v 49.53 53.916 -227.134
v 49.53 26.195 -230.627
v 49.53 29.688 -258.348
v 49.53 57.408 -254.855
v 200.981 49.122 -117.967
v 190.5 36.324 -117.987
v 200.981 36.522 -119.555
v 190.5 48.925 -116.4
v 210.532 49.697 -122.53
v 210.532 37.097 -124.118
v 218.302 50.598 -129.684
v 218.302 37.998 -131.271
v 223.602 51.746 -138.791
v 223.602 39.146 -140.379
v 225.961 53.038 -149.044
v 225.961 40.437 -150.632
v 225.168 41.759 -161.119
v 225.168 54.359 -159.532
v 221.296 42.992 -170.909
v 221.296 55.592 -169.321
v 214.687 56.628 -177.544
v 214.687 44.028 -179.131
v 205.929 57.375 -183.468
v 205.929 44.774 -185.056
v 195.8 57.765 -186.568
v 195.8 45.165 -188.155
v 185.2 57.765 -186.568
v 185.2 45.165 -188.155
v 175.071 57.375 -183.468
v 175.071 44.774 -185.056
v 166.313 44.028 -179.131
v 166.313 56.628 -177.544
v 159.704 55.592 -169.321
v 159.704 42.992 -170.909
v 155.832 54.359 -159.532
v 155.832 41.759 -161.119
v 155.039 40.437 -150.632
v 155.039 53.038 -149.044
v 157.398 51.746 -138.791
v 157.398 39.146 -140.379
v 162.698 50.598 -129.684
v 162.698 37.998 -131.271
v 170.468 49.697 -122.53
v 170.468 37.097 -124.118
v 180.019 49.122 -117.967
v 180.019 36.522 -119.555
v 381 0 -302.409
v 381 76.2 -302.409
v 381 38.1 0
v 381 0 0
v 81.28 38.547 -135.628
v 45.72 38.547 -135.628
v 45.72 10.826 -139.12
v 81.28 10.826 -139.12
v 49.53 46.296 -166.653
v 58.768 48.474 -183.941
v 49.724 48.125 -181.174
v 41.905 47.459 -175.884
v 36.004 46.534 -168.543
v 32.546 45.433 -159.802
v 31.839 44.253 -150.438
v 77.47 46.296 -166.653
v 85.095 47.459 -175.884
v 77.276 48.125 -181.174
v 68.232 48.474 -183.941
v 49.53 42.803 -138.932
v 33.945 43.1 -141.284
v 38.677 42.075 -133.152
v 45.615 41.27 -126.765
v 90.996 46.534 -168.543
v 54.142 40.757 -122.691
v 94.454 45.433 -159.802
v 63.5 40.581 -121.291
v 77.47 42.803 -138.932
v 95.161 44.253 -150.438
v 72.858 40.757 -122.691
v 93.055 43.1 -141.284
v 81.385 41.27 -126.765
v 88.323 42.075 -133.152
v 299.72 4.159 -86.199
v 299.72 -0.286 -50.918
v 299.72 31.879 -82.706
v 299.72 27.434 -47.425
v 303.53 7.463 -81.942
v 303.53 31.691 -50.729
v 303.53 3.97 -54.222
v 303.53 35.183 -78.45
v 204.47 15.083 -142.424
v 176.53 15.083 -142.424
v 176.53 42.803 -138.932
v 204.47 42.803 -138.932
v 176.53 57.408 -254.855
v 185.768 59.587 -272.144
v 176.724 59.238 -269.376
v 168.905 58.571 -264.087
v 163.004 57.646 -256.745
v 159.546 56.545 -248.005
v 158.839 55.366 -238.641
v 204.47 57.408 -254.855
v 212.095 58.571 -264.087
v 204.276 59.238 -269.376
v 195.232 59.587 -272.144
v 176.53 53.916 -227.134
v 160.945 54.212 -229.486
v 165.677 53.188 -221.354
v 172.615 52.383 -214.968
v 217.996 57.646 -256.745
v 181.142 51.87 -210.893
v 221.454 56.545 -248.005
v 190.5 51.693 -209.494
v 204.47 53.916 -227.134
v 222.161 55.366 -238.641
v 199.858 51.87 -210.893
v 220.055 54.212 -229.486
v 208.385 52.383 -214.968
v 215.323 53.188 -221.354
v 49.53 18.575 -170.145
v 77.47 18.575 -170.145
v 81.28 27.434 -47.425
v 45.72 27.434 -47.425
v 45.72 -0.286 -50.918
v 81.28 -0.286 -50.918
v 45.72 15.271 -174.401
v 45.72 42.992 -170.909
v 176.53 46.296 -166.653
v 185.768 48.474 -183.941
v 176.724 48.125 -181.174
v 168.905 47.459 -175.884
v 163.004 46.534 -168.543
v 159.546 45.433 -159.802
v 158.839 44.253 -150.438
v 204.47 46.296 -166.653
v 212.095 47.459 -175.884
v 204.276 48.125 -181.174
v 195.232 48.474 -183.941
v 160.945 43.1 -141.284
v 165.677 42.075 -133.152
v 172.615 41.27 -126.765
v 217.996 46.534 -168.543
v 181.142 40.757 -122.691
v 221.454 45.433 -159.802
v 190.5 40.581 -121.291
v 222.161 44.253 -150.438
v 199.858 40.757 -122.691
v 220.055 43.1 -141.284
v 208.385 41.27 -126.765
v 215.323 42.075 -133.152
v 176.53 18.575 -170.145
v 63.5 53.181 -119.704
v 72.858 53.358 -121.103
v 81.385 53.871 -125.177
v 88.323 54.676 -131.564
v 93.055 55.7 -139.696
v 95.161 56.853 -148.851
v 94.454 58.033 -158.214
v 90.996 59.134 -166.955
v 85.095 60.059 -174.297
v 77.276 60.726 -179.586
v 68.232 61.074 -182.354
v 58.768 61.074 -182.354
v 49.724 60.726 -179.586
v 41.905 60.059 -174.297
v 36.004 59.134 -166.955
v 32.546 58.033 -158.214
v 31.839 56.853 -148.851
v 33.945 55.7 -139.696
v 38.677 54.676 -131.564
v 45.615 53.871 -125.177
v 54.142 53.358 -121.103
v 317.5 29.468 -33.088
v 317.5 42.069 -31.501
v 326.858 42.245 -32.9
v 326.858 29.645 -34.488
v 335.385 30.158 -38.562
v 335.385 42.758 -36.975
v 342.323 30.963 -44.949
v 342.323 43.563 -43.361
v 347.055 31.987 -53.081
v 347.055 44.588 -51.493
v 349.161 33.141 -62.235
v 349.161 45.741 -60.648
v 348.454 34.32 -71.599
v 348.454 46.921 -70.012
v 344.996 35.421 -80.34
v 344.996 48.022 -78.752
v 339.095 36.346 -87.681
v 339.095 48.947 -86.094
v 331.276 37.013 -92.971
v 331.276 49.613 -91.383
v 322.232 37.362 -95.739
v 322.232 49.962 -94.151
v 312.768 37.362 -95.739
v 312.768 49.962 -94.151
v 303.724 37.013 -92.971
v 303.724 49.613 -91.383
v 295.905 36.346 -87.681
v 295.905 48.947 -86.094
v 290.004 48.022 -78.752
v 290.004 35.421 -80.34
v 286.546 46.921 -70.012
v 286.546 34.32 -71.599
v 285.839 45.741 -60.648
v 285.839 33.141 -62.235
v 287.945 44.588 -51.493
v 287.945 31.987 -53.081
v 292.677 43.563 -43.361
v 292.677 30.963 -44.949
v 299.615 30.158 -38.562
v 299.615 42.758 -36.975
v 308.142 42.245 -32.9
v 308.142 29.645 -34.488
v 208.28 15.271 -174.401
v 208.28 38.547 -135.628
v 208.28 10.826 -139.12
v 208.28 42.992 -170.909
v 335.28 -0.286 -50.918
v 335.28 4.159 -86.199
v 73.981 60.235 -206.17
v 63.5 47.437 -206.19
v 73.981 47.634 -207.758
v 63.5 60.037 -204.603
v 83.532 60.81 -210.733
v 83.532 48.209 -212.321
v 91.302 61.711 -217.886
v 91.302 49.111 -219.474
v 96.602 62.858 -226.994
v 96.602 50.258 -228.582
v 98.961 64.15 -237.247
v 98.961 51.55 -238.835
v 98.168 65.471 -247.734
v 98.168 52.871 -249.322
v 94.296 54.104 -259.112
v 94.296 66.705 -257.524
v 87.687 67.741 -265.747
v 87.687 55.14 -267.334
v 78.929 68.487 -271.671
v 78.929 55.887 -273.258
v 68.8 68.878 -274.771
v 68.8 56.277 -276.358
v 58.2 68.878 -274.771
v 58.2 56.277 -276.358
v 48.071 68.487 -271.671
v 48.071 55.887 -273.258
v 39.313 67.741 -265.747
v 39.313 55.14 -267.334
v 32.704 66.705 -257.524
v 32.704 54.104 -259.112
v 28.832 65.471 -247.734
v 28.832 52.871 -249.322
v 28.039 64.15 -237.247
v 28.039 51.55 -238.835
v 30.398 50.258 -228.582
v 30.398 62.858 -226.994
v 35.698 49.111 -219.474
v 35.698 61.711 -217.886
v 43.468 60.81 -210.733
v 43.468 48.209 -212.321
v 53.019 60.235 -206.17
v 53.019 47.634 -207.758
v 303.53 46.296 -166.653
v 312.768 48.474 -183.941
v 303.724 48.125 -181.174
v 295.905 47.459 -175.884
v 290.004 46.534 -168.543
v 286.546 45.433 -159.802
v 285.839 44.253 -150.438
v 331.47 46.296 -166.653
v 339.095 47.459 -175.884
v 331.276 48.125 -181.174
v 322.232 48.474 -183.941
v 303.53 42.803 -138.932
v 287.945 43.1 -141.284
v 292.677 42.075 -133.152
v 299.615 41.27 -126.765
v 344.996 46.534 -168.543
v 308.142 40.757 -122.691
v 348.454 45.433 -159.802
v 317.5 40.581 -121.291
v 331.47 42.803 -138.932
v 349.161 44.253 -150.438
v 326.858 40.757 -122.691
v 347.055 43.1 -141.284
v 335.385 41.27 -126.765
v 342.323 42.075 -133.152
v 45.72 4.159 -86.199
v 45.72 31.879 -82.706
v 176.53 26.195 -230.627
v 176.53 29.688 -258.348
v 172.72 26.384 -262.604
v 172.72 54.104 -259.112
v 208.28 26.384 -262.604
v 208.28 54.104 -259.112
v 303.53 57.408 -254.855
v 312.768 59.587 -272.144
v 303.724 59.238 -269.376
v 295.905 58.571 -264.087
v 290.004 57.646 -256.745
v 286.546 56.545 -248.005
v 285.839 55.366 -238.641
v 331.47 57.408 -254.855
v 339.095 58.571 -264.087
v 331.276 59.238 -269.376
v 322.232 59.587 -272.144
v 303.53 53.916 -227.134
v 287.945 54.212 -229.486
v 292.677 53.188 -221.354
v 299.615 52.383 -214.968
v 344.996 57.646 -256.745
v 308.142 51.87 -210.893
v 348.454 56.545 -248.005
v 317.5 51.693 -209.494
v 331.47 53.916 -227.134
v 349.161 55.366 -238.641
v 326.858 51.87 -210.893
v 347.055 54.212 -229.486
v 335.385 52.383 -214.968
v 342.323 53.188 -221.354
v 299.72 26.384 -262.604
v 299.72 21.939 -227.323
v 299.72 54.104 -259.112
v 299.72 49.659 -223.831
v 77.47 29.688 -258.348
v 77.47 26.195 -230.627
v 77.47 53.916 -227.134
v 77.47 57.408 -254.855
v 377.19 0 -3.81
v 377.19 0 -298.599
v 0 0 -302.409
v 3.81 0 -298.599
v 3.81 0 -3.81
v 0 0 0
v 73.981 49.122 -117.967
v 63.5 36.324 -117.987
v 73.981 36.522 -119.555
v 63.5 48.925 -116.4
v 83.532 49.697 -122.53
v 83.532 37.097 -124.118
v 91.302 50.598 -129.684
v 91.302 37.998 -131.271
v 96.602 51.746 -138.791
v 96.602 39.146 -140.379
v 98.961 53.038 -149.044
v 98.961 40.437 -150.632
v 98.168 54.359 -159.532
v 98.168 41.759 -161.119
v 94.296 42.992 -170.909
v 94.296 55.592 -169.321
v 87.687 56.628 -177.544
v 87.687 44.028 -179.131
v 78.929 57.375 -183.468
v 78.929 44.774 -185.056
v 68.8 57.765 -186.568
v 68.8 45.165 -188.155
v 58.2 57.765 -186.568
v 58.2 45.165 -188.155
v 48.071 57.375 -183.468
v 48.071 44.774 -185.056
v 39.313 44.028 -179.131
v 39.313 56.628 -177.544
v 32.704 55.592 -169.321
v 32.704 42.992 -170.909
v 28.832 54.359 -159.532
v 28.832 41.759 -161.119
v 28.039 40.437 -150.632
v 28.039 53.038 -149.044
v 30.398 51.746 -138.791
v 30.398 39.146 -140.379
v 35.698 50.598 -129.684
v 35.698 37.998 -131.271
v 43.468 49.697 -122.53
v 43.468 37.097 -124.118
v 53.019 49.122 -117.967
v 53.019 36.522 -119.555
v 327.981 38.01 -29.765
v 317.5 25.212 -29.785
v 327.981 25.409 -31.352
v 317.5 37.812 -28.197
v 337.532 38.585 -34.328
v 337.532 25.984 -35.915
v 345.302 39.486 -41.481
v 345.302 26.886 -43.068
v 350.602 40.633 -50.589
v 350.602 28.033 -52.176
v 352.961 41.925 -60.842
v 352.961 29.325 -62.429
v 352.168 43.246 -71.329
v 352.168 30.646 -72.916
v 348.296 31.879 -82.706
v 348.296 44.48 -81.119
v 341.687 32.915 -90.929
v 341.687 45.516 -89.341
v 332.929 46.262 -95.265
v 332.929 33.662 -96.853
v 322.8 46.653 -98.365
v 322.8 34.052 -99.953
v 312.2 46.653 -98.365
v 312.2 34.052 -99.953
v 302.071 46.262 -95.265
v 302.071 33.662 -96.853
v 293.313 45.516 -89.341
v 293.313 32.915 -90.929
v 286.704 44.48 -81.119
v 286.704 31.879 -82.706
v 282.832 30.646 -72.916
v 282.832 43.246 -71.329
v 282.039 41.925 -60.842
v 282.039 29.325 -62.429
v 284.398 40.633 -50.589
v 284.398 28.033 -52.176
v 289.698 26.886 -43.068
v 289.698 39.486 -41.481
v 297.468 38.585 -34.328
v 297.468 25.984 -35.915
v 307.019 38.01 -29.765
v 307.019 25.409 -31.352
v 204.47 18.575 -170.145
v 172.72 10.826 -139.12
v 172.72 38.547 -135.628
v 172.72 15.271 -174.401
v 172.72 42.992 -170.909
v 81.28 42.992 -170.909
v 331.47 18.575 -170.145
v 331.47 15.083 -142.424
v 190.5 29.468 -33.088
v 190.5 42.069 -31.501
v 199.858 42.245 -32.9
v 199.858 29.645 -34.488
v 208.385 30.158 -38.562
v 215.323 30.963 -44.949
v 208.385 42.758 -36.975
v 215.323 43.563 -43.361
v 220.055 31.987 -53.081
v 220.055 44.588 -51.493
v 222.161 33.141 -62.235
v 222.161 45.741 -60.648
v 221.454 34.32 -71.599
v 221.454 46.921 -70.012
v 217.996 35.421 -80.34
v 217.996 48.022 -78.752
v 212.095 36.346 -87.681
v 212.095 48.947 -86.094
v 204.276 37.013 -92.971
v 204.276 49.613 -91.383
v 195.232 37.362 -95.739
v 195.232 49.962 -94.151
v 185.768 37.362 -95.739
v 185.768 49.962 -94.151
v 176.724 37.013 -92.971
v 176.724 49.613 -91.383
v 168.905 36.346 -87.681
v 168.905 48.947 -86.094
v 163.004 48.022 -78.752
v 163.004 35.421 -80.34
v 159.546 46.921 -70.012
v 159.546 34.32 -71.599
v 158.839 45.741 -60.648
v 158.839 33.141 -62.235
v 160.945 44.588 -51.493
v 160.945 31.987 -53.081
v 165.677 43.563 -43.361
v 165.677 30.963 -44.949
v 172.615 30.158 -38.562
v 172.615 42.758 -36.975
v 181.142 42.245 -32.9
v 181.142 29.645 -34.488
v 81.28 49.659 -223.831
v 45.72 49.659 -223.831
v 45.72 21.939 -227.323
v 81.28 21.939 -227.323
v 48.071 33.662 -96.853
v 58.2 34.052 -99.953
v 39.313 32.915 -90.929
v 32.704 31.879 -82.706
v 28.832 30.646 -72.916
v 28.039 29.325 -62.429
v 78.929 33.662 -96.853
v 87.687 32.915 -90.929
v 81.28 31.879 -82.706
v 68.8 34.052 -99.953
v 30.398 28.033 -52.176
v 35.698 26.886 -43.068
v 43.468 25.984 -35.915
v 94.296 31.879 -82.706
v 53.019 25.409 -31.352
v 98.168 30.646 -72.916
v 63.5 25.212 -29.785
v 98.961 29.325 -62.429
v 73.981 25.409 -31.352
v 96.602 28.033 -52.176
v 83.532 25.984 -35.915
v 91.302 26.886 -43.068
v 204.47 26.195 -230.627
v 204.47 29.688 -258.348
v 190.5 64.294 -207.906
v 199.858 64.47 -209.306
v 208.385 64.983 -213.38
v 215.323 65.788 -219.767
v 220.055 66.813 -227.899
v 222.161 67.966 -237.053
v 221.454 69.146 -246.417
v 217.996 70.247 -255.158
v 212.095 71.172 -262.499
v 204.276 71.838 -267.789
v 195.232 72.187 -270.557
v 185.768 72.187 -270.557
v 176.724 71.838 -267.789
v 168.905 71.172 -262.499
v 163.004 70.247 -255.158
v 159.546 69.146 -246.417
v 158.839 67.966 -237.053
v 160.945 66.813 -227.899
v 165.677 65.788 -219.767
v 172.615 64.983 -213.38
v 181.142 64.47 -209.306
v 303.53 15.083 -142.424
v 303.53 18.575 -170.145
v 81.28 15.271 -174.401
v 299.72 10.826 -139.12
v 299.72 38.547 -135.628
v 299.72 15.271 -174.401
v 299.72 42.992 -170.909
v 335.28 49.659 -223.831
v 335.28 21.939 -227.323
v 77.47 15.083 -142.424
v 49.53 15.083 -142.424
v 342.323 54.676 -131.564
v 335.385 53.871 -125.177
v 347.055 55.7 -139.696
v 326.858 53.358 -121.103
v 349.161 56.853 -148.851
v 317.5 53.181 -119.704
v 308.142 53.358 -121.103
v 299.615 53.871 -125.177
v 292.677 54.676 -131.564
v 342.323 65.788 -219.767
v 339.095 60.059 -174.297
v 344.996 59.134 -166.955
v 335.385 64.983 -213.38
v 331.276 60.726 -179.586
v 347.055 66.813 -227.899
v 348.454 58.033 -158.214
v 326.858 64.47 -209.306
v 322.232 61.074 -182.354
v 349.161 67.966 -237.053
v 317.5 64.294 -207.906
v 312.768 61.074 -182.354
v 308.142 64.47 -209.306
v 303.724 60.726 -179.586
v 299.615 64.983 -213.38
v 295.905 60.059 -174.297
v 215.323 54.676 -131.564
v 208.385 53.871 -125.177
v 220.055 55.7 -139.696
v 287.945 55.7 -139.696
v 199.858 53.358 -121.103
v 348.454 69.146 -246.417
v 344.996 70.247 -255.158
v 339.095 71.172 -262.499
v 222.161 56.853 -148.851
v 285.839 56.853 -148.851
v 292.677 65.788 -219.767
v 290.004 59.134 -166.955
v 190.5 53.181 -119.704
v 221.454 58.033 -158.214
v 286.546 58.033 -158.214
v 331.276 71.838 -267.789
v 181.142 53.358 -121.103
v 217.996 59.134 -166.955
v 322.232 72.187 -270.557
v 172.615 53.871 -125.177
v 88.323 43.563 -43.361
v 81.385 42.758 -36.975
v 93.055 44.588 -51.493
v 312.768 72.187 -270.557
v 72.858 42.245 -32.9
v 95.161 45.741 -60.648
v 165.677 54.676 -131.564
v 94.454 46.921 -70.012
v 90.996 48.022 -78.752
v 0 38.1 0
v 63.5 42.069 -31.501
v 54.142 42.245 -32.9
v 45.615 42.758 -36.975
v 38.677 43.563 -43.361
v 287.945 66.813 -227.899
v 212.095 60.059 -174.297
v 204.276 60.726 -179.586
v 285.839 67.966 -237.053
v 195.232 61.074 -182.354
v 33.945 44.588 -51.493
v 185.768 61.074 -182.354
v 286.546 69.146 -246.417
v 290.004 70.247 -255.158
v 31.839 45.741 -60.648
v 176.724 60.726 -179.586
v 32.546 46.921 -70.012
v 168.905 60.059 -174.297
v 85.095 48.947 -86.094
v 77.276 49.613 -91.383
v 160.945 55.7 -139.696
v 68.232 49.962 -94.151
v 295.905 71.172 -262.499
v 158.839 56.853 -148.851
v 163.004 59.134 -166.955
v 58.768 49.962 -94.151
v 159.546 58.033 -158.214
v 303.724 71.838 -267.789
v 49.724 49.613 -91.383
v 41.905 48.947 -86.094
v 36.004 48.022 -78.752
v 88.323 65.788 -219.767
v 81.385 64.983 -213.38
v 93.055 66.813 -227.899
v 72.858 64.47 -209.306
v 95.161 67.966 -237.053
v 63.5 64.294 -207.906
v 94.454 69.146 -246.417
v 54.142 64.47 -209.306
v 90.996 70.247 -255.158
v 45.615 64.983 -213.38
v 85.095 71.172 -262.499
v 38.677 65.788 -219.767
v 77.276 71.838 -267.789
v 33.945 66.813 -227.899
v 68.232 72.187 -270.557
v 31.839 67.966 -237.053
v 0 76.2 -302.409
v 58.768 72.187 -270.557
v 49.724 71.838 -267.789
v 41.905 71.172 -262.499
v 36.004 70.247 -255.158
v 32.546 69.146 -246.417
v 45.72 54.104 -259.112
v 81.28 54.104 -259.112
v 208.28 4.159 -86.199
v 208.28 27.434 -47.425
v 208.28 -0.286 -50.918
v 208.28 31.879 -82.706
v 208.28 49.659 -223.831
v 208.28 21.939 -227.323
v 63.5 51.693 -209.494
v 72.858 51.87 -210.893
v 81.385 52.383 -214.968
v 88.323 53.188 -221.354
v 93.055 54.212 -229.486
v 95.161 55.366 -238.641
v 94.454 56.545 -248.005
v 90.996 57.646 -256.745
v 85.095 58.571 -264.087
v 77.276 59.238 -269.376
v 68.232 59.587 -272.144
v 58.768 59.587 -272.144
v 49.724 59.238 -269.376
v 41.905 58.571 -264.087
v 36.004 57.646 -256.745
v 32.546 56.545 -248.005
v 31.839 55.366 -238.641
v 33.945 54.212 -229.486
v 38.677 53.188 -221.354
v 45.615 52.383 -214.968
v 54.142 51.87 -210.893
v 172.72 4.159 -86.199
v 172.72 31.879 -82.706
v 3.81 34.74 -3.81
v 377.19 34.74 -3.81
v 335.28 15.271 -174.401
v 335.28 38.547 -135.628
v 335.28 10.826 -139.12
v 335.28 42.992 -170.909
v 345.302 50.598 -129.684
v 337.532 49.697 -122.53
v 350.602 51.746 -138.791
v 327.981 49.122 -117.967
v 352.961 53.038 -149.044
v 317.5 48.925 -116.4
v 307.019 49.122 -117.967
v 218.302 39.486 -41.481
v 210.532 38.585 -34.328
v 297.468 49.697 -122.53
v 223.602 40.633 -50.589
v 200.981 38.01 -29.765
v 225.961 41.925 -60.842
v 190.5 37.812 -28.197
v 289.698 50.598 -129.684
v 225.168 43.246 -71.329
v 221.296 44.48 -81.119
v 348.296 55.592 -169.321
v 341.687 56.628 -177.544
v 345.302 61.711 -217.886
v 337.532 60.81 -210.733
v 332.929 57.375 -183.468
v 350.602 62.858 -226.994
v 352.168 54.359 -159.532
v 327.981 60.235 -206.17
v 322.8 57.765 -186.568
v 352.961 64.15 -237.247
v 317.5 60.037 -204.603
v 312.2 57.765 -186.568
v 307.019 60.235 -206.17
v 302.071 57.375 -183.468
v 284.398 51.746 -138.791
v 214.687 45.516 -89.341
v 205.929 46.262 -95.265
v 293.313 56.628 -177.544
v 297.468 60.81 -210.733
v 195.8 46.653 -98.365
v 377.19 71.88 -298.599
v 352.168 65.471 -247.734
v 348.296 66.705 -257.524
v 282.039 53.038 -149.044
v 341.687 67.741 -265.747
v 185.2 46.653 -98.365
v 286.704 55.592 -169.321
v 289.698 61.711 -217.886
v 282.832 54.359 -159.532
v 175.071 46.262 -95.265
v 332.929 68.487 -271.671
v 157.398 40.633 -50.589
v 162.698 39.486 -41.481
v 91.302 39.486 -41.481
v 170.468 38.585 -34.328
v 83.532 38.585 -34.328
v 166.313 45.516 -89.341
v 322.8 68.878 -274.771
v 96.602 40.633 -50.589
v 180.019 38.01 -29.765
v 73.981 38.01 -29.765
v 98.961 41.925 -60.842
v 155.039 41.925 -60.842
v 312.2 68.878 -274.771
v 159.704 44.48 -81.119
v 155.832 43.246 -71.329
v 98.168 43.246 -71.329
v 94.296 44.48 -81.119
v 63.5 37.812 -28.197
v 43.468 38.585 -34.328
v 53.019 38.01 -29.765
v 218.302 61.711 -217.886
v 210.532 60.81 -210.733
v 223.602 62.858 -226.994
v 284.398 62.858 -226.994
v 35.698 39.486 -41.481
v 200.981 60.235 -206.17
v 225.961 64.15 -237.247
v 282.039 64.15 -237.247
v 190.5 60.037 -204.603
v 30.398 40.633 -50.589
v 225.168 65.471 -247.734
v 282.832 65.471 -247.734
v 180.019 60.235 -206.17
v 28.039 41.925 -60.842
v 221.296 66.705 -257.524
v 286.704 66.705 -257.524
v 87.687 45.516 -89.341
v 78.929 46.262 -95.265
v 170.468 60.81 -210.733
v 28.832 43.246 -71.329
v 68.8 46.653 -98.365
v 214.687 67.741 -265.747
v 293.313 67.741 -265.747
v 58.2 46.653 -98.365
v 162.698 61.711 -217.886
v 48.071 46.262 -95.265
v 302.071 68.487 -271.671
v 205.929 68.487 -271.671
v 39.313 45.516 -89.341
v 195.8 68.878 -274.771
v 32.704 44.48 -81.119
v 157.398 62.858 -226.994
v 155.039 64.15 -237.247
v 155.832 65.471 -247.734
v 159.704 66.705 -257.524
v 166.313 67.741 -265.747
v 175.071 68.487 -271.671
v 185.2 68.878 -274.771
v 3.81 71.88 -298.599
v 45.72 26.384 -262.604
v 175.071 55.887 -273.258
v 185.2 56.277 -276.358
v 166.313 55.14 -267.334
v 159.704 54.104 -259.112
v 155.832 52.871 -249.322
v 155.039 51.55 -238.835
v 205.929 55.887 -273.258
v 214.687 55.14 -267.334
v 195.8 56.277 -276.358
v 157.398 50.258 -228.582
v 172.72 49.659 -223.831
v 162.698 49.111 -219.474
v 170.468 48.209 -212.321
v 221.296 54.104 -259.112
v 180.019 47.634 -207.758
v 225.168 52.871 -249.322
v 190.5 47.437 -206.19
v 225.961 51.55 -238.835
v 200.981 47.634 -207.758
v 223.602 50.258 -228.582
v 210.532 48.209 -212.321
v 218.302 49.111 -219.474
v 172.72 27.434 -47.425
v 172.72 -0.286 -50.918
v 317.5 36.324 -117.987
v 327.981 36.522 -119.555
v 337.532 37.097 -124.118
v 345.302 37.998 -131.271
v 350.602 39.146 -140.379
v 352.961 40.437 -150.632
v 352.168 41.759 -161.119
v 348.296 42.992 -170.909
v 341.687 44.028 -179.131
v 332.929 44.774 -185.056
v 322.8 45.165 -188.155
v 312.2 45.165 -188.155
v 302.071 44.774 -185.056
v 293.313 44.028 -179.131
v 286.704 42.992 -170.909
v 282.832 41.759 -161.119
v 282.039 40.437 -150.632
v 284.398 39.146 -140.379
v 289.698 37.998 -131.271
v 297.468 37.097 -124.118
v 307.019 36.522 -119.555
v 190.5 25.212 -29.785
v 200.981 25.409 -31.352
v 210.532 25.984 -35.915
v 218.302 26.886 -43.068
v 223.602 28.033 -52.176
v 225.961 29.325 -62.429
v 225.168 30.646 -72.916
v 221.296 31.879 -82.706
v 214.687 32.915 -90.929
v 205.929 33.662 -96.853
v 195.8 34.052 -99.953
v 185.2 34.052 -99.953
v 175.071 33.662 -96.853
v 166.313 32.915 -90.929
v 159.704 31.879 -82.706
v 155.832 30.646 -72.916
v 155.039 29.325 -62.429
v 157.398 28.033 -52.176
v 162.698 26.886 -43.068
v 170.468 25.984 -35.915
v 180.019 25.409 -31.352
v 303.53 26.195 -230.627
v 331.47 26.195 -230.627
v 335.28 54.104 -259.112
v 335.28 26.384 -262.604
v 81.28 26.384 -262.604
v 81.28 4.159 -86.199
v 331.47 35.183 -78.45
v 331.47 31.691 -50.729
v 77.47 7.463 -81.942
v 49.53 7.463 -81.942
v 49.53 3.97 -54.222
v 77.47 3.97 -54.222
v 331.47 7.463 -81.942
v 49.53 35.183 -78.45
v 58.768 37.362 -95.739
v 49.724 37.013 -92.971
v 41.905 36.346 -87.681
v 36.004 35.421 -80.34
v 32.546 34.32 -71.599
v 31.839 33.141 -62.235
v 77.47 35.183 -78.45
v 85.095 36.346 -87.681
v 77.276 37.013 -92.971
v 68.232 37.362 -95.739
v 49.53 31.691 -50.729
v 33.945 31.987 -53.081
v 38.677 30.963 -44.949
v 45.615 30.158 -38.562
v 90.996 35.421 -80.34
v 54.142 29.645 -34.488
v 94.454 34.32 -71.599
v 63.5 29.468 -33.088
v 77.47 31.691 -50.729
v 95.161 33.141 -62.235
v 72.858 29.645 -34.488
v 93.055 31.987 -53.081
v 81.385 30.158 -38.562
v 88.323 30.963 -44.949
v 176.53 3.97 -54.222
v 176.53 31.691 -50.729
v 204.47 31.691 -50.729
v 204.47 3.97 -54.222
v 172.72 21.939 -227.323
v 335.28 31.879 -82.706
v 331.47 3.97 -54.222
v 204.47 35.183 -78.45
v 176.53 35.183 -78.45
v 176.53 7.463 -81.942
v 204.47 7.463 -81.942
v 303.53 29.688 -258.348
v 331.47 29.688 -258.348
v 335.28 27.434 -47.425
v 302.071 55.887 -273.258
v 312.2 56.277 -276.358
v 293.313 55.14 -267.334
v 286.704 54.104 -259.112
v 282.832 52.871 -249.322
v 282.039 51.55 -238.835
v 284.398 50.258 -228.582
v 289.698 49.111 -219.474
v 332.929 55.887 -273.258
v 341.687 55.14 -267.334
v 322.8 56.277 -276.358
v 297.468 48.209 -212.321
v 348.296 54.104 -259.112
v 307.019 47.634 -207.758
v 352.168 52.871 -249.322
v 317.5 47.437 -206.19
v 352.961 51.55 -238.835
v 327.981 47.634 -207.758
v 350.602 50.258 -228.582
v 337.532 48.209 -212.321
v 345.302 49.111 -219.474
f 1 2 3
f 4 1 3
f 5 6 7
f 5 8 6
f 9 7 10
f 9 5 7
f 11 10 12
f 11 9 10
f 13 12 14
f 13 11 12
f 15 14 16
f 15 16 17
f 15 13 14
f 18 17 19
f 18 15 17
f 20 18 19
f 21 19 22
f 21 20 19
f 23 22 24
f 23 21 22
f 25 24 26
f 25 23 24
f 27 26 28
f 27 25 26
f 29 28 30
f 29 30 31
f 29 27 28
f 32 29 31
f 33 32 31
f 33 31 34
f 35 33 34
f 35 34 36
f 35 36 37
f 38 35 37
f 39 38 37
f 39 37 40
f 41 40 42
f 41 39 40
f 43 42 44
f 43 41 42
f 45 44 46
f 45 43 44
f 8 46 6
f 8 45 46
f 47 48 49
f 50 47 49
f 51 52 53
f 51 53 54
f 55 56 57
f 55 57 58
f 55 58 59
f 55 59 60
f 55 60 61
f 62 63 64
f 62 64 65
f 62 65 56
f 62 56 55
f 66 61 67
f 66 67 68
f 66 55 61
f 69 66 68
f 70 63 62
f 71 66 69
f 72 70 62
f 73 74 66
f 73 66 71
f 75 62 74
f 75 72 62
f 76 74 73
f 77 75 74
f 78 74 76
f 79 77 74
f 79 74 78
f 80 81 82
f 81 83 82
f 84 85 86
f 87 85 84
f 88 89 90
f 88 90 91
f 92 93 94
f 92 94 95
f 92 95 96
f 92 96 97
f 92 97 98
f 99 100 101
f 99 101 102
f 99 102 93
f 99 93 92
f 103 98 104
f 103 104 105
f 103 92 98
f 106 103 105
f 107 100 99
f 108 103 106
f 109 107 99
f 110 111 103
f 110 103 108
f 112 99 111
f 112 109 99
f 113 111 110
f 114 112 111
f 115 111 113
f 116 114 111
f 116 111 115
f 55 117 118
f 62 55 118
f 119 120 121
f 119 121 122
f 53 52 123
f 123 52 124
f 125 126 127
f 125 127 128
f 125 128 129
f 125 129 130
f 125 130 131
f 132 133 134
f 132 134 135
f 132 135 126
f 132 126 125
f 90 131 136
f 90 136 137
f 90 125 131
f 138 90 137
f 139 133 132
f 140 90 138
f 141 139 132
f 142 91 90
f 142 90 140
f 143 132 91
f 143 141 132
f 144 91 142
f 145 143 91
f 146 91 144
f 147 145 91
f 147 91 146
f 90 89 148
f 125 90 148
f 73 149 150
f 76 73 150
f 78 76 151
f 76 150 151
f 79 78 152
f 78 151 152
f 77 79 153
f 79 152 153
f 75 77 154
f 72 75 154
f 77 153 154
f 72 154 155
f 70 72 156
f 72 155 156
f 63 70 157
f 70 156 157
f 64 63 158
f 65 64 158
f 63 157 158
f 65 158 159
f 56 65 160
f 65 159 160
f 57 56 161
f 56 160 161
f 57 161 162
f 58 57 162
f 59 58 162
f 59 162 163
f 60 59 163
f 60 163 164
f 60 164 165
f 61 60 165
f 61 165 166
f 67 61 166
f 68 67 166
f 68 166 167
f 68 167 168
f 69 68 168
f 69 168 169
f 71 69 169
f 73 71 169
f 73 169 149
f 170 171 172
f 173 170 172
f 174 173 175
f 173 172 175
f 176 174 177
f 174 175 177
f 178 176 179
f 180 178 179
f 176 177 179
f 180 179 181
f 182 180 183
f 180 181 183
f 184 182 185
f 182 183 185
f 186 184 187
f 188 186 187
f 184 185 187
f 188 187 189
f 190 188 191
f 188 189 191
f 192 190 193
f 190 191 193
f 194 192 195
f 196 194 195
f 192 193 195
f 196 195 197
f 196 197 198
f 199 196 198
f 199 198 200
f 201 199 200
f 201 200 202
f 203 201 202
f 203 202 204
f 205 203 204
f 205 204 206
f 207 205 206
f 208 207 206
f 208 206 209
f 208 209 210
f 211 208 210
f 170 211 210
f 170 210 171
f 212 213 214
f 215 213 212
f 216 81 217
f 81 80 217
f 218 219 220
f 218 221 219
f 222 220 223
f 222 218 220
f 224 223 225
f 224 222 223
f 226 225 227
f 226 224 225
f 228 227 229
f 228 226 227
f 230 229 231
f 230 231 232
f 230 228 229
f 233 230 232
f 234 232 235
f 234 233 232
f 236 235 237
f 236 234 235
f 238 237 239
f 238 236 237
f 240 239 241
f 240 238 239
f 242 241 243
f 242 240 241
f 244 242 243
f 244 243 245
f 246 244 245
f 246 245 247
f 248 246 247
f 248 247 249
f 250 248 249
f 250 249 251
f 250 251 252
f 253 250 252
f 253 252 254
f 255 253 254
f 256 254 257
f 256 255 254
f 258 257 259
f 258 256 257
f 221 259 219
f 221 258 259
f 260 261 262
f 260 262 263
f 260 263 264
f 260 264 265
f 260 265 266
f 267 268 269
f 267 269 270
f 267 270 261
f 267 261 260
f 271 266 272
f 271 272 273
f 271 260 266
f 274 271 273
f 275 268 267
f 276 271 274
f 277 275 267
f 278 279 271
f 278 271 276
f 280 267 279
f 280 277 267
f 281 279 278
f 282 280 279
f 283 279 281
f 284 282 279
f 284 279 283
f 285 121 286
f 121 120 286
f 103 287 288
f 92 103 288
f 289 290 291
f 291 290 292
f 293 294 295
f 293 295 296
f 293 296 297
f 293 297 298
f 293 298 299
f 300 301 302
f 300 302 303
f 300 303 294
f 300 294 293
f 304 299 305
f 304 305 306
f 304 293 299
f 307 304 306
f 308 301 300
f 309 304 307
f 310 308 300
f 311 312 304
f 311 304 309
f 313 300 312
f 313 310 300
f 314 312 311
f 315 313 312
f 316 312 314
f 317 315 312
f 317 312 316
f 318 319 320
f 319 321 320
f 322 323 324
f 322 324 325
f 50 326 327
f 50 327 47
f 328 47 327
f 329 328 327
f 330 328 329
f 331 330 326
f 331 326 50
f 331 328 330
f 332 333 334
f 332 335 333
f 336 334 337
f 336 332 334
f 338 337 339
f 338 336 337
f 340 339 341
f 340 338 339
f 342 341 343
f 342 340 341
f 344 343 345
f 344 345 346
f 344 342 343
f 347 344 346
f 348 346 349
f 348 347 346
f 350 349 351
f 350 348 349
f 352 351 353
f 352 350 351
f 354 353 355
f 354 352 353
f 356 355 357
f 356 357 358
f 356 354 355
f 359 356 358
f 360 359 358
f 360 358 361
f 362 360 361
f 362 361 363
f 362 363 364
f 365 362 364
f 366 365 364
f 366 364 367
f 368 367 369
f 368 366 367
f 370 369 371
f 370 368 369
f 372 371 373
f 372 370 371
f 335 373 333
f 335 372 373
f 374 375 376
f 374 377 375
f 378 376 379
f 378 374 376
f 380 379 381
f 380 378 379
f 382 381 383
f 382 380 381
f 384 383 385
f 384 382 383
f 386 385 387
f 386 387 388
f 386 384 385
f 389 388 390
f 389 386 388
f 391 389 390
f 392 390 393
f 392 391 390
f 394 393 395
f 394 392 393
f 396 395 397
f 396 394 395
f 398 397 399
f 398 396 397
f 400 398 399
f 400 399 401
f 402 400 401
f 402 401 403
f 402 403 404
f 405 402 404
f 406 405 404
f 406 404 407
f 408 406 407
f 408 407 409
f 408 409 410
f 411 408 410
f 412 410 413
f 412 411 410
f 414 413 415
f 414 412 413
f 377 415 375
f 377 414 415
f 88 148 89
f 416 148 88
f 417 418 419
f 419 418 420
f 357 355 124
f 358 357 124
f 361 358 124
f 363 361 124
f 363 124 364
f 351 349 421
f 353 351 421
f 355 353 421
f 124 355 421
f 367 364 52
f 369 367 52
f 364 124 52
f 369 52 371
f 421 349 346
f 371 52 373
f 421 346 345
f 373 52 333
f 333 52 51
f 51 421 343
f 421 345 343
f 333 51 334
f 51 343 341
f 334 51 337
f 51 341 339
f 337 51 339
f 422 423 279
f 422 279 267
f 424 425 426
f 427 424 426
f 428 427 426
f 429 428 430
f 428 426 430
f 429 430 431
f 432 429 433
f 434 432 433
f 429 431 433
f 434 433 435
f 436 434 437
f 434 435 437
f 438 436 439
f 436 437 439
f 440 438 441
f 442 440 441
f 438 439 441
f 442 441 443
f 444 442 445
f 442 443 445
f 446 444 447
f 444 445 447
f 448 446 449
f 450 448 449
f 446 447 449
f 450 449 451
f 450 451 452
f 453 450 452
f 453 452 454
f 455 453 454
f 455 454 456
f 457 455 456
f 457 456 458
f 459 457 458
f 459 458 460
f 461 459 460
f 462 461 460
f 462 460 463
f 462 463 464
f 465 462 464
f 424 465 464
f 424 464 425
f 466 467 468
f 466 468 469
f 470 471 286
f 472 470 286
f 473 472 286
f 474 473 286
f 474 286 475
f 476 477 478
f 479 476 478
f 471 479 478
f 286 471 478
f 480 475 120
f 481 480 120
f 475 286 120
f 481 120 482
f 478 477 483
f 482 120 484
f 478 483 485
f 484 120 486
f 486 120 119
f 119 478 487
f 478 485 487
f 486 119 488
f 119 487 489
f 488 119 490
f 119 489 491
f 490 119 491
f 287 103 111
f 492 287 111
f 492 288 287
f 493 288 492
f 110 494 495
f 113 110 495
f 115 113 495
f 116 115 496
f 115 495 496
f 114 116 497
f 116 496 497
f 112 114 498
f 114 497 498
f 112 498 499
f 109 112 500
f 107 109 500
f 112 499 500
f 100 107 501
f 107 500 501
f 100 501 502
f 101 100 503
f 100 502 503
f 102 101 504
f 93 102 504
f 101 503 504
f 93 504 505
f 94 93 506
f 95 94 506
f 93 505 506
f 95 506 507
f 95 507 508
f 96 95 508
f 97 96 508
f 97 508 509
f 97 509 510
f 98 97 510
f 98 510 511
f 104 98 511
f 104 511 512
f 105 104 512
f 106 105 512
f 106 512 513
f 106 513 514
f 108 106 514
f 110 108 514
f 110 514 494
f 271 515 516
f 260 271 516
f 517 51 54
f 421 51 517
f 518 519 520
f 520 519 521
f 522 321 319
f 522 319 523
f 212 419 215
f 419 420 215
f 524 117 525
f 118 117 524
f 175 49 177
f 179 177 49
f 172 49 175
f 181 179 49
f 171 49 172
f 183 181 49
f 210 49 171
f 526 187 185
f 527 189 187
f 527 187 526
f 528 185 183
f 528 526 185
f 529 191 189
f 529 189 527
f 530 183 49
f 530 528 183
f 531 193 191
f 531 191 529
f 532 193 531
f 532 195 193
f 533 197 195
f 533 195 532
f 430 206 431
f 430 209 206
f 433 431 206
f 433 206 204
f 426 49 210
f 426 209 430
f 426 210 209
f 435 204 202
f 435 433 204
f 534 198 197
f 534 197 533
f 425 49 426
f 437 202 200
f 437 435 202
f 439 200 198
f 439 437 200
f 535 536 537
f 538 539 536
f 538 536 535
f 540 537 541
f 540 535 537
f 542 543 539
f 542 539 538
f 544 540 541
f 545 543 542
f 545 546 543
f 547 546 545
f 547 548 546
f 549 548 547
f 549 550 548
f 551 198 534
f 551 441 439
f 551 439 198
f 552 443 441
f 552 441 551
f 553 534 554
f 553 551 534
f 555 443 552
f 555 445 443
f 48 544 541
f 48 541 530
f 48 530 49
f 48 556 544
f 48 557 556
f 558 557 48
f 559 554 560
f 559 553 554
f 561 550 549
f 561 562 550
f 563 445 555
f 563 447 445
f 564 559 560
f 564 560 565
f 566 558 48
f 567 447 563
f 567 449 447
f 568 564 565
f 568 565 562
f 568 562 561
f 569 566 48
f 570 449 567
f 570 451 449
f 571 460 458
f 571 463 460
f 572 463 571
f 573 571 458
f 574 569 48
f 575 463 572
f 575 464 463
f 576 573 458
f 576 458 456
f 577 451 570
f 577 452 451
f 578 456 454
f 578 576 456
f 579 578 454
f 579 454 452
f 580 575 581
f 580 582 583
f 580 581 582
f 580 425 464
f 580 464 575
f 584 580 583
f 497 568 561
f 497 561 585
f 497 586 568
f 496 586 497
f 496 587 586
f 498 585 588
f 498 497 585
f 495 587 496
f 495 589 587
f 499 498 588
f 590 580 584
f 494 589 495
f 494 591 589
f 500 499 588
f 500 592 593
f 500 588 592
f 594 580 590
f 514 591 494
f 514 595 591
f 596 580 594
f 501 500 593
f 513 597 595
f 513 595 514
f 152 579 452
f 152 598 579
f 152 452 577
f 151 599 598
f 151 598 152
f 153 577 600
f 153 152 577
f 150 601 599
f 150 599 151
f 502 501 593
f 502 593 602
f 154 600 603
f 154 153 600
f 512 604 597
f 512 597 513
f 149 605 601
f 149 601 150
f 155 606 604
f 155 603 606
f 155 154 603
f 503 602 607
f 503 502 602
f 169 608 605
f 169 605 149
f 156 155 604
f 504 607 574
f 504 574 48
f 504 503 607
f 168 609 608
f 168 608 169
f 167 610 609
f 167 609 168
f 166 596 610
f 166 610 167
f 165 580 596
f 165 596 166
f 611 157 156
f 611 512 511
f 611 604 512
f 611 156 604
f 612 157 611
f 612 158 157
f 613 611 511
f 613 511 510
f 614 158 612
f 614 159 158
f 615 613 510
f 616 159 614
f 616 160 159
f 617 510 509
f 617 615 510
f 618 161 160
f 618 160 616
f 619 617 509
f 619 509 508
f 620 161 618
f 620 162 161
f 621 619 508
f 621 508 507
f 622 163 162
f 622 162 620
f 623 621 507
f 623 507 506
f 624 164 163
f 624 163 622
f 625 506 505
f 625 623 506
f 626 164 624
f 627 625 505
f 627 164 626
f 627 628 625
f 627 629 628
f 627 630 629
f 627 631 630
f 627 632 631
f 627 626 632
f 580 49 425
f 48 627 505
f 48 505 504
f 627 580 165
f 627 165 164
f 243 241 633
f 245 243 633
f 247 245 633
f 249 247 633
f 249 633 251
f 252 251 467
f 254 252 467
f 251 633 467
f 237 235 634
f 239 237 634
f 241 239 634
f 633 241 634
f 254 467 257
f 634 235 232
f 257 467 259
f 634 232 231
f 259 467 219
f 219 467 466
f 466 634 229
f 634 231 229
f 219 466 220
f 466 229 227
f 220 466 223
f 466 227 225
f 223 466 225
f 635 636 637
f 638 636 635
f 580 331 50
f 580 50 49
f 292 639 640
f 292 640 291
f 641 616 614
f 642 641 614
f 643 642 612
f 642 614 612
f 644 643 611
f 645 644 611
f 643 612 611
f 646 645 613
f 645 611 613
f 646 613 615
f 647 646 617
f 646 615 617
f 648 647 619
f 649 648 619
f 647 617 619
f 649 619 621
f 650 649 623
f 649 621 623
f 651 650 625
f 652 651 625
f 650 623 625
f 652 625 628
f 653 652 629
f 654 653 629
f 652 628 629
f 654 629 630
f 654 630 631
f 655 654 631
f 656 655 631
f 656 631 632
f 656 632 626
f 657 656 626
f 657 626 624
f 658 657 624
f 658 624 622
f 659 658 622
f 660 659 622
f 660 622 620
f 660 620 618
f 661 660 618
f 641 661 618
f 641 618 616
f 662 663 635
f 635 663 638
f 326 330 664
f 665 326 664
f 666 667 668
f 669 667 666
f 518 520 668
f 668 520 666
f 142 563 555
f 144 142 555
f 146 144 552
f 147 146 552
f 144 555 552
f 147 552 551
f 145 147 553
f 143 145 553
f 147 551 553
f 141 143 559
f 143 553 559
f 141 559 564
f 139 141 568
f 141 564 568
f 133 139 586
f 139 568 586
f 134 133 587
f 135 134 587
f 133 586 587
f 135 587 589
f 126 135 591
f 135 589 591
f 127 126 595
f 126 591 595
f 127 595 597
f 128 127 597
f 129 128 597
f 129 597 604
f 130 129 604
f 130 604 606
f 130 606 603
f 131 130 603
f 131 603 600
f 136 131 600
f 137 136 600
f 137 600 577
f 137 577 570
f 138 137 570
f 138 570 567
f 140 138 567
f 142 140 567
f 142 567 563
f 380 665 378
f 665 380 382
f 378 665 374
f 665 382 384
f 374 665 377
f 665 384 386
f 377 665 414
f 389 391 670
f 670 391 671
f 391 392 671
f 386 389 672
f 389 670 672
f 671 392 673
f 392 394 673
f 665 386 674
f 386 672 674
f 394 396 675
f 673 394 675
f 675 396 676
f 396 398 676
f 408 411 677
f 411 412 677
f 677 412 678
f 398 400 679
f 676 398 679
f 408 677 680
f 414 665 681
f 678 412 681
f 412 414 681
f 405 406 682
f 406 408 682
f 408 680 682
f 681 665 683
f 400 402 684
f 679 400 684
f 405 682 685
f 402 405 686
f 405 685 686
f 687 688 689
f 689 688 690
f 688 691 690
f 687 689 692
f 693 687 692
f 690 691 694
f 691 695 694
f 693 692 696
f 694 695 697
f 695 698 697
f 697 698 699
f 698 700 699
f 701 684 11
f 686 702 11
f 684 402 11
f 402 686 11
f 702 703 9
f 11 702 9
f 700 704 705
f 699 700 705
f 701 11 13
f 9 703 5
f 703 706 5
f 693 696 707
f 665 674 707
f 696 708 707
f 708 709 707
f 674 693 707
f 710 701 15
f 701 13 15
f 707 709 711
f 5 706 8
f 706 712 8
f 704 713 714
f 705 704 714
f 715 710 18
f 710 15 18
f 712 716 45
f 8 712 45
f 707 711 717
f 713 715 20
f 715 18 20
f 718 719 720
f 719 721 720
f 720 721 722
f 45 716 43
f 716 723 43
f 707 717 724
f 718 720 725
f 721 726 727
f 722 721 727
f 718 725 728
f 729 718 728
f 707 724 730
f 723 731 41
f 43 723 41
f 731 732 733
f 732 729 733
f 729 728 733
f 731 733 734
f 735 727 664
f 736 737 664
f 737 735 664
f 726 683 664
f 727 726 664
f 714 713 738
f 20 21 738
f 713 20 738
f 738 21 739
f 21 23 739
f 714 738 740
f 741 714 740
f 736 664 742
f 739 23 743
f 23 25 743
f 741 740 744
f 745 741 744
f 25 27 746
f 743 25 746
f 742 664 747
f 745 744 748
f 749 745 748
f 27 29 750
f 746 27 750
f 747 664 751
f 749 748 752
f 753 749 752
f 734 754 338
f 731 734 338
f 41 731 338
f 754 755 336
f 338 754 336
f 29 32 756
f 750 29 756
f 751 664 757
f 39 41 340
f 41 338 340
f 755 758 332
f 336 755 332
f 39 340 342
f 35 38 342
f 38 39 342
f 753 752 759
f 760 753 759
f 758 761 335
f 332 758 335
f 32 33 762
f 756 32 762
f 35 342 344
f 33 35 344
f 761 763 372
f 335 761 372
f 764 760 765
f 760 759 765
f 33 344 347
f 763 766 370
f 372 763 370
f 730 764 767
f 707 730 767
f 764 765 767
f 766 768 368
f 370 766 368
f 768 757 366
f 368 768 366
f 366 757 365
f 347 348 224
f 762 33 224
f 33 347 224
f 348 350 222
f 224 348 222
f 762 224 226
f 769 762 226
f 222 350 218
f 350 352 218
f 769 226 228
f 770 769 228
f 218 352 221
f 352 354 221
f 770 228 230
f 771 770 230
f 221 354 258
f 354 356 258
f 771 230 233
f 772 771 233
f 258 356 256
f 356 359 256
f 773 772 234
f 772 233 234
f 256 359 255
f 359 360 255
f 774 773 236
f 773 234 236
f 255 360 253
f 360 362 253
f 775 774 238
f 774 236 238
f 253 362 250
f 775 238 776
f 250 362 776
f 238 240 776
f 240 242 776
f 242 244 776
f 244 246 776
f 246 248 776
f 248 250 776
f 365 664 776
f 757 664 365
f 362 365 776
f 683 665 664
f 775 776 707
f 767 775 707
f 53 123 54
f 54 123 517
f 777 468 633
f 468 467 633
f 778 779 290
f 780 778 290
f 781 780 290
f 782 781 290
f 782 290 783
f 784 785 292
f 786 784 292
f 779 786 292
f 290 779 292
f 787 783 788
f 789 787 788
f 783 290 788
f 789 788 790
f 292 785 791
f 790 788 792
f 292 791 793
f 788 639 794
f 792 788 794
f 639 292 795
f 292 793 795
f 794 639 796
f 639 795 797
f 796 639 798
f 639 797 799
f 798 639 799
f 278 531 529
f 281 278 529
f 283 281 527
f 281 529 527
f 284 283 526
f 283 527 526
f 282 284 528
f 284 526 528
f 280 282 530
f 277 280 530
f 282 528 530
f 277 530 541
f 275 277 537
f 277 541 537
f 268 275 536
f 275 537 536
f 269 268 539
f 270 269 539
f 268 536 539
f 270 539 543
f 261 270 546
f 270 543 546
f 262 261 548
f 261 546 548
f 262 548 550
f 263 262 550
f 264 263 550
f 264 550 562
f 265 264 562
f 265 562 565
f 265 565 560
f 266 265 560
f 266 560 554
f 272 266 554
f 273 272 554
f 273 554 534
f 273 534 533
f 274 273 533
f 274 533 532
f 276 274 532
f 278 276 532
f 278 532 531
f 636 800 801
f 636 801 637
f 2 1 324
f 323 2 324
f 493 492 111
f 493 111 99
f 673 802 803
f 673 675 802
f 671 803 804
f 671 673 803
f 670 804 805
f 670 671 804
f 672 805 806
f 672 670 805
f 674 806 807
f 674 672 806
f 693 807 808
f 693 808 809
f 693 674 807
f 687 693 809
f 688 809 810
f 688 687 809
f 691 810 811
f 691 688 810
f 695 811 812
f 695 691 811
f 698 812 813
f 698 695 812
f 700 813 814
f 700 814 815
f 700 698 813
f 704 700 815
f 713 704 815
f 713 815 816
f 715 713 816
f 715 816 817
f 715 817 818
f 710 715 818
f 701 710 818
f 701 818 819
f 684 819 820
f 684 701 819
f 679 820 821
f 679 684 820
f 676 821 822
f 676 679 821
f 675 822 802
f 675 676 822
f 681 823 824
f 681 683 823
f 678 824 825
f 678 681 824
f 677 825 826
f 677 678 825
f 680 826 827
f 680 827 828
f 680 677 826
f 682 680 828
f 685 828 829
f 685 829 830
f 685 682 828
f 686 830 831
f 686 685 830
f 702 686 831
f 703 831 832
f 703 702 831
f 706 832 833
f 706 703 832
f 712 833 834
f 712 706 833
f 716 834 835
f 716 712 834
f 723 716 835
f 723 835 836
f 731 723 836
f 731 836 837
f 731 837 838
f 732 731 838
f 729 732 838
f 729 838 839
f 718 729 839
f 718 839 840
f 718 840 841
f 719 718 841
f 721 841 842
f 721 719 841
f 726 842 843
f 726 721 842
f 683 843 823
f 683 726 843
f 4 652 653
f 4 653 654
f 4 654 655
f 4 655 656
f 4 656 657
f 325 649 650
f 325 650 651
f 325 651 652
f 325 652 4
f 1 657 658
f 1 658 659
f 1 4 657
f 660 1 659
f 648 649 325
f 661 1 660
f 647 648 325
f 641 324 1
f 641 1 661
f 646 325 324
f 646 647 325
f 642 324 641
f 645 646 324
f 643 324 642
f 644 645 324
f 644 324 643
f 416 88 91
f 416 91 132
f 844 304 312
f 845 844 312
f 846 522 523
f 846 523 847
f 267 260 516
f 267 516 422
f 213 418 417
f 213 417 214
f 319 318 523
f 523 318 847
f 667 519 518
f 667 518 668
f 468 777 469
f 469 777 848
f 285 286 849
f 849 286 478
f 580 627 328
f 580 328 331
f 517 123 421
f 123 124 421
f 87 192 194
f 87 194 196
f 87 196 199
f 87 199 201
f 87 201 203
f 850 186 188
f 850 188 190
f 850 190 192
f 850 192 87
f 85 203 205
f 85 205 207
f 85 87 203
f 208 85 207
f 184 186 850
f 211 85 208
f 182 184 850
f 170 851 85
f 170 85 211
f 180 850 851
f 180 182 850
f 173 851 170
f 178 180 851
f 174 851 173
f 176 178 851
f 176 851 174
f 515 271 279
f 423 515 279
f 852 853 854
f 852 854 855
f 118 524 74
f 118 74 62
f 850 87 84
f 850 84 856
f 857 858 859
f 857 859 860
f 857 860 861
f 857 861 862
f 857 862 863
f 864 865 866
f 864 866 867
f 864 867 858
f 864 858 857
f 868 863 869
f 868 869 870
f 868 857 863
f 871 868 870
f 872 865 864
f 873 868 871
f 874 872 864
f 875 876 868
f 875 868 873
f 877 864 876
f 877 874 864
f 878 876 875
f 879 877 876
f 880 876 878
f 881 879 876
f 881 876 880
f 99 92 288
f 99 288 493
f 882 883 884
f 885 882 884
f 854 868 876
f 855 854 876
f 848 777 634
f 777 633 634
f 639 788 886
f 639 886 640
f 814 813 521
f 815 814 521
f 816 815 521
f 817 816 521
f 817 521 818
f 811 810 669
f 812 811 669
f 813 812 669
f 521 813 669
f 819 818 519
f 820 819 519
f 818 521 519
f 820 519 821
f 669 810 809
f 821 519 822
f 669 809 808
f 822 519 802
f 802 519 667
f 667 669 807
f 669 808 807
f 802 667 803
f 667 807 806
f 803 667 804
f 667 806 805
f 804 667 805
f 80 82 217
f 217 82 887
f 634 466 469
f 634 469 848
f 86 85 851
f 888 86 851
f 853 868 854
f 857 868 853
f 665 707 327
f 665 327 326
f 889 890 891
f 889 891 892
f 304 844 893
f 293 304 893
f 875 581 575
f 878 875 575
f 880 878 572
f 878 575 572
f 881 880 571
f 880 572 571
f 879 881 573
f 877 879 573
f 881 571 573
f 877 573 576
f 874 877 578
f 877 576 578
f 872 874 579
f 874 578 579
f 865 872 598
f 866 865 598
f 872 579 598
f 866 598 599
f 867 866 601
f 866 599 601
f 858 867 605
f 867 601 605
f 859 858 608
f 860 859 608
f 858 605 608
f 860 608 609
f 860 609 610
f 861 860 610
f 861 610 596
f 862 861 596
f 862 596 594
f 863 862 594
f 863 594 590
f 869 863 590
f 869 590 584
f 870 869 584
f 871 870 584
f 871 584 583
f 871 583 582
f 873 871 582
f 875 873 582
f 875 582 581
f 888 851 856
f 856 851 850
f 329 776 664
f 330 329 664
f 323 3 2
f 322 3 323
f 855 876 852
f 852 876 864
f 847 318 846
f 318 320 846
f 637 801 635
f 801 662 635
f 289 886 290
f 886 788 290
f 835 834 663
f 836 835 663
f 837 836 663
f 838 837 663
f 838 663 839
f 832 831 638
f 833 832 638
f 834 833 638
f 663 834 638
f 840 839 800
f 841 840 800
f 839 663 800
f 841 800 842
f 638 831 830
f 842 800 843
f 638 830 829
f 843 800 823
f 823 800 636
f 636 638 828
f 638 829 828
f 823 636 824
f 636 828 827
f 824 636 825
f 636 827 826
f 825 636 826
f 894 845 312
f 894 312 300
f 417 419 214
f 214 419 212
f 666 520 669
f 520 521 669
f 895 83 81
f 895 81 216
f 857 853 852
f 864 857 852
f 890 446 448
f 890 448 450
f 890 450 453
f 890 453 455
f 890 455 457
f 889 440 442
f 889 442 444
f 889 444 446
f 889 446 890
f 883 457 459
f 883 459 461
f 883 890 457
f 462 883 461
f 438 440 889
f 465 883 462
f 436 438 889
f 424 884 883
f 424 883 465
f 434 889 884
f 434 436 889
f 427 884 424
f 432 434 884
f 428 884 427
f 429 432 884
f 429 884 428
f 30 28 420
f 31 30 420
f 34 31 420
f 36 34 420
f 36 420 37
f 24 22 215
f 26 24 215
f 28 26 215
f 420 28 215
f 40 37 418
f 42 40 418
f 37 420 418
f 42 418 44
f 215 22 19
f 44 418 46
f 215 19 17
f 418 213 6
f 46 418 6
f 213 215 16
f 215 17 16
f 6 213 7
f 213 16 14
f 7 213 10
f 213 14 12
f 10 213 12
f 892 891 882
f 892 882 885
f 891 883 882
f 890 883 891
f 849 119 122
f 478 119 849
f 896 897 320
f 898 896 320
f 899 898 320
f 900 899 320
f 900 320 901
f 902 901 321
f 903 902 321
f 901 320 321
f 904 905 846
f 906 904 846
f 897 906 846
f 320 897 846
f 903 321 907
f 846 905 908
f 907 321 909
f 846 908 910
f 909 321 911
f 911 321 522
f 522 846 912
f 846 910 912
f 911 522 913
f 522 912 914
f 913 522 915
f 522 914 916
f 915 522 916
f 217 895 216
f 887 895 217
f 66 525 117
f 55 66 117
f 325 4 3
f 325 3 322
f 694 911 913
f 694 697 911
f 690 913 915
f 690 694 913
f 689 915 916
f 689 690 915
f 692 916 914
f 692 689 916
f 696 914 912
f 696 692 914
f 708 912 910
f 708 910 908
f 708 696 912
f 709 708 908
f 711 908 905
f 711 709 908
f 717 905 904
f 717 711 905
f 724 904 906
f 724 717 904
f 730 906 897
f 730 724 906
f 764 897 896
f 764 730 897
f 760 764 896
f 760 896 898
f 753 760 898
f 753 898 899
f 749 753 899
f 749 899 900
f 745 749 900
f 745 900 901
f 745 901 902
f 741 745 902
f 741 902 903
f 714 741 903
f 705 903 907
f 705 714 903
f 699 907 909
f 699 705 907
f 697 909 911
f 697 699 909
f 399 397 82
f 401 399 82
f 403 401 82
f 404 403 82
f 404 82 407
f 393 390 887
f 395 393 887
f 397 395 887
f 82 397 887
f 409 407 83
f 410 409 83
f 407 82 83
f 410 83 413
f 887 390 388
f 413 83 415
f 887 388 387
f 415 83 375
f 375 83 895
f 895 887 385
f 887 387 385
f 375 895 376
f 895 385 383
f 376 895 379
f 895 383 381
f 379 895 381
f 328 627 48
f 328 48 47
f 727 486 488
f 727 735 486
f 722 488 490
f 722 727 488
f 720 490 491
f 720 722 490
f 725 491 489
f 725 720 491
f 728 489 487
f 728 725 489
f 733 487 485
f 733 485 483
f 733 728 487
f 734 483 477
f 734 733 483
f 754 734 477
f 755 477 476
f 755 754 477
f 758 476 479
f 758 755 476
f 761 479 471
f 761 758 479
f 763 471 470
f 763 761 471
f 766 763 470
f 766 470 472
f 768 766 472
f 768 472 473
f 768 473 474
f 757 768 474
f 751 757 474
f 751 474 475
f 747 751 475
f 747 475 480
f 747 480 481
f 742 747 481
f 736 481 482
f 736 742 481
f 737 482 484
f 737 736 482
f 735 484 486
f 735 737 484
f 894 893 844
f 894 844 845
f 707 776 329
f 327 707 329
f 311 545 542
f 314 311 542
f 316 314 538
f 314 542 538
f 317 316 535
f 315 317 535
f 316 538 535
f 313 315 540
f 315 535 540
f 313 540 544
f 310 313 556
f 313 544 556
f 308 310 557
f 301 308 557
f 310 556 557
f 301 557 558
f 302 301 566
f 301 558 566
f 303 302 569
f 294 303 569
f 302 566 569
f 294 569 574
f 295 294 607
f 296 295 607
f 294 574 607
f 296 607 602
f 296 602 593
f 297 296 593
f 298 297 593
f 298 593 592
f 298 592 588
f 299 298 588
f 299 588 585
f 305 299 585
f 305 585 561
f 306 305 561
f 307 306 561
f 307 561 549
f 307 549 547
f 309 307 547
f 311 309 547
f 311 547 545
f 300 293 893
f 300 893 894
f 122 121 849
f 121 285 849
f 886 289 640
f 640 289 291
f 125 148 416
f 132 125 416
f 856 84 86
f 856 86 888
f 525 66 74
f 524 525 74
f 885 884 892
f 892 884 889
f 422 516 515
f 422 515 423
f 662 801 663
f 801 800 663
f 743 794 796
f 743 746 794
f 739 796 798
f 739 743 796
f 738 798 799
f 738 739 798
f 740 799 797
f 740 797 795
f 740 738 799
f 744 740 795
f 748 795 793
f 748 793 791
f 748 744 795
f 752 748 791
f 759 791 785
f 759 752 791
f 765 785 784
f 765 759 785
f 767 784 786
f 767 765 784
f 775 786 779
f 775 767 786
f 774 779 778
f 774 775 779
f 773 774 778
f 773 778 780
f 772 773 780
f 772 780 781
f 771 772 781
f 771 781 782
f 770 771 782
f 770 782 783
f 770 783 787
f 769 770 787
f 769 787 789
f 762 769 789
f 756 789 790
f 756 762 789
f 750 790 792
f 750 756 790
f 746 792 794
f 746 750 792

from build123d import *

# Parameters (mm, degrees)
BOSS_EXTRUDE1_DEPTH = 381
SKETCH2_R           = 31.75
SKETCH2_W           = 27.94
SKETCH2_H           = 27.94
CUT_EXTRUDE2_DEPTH  = 15.24
SKETCH2_3_W         = 27.94
SKETCH2_3_H         = 27.94
CUT_EXTRUDE3_DEPTH  = 43.18
SHELL1_T            = -3.81


with BuildPart() as part:
    # Sketch1 → Boss-Extrude1 (new body)
    with BuildSketch(Plane(origin=(0, 0, 0), x_dir=(0, 0, -1), z_dir=(1, 0, 0))):
        Polygon((0, 0), (0, 38.1), (302.409374855, 76.2), (302.409374855, 0), align=None)
    extrude(amount=BOSS_EXTRUDE1_DEPTH)

    # Sketch2 → Cut-Extrude2 (cut)
    # profile 1 of 9: a face of its own
    with BuildSketch(Plane(origin=(0, 40.024765624, 5.042646482), x_dir=(1, 0, 0), z_dir=(0, 0.9921567416492215, 0.12500000000000003))):
        with Locations((63.5, 246.0625)):
            Circle(SKETCH2_R)
        with Locations((63.5, 246.0625)):
            Rectangle(SKETCH2_W, SKETCH2_H, mode=Mode.SUBTRACT)
    # profile 2 of 9: a face of its own
    with BuildSketch(Plane(origin=(0, 40.024765624, 5.042646482), x_dir=(1, 0, 0), z_dir=(0, 0.9921567416492215, 0.12500000000000003))):
        with Locations((190.5, 246.0625)):
            Circle(SKETCH2_R)
        with Locations((190.5, 246.0625)):
            Rectangle(SKETCH2_W, SKETCH2_H, mode=Mode.SUBTRACT)
    # profile 3 of 9: a face of its own
    with BuildSketch(Plane(origin=(0, 40.024765624, 5.042646482), x_dir=(1, 0, 0), z_dir=(0, 0.9921567416492215, 0.12500000000000003))):
        with Locations((317.5, 246.0625)):
            Circle(SKETCH2_R)
        with Locations((317.5, 246.0625)):
            Rectangle(SKETCH2_W, SKETCH2_H, mode=Mode.SUBTRACT)
    # profile 4 of 9: a face of its own
    with BuildSketch(Plane(origin=(0, 40.024765624, 5.042646482), x_dir=(1, 0, 0), z_dir=(0, 0.9921567416492215, 0.12500000000000003))):
        with Locations((63.5, 157.1625)):
            Circle(SKETCH2_R)
        with Locations((63.5, 157.1625)):
            Rectangle(SKETCH2_W, SKETCH2_H, mode=Mode.SUBTRACT)
    # profile 5 of 9: a face of its own
    with BuildSketch(Plane(origin=(0, 40.024765624, 5.042646482), x_dir=(1, 0, 0), z_dir=(0, 0.9921567416492215, 0.12500000000000003))):
        with Locations((63.5, 68.2625)):
            Circle(SKETCH2_R)
        with Locations((63.5, 68.2625)):
            Rectangle(SKETCH2_W, SKETCH2_H, mode=Mode.SUBTRACT)
    # profile 6 of 9: a face of its own
    with BuildSketch(Plane(origin=(0, 40.024765624, 5.042646482), x_dir=(1, 0, 0), z_dir=(0, 0.9921567416492215, 0.12500000000000003))):
        with Locations((190.5, 157.1625)):
            Circle(SKETCH2_R)
        with Locations((190.5, 157.1625)):
            Rectangle(SKETCH2_W, SKETCH2_H, mode=Mode.SUBTRACT)
    # profile 7 of 9: a face of its own
    with BuildSketch(Plane(origin=(0, 40.024765624, 5.042646482), x_dir=(1, 0, 0), z_dir=(0, 0.9921567416492215, 0.12500000000000003))):
        with Locations((190.5, 68.2625)):
            Circle(SKETCH2_R)
        with Locations((190.5, 68.2625)):
            Rectangle(SKETCH2_W, SKETCH2_H, mode=Mode.SUBTRACT)
    # profile 8 of 9: a face of its own
    with BuildSketch(Plane(origin=(0, 40.024765624, 5.042646482), x_dir=(1, 0, 0), z_dir=(0, 0.9921567416492215, 0.12500000000000003))):
        with Locations((317.5, 68.2625)):
            Circle(SKETCH2_R)
        with Locations((317.5, 68.2625)):
            Rectangle(SKETCH2_W, SKETCH2_H, mode=Mode.SUBTRACT)
    # profile 9 of 9: a face of its own
    with BuildSketch(Plane(origin=(0, 40.024765624, 5.042646482), x_dir=(1, 0, 0), z_dir=(0, 0.9921567416492215, 0.12500000000000003))):
        with Locations((317.5, 157.1625)):
            Circle(SKETCH2_R)
        with Locations((317.5, 157.1625)):
            Rectangle(SKETCH2_W, SKETCH2_H, mode=Mode.SUBTRACT)
    extrude(amount=-CUT_EXTRUDE2_DEPTH, mode=Mode.SUBTRACT)

    # Sketch2<3> → Cut-Extrude3 (cut)
    with BuildSketch(Plane(origin=(0, 40.024765624, 5.042646482), x_dir=(1, 0, 0), z_dir=(0, 0.9921567416492215, 0.12500000000000003))):
        with Locations((317.5, 246.0625)):
            Rectangle(SKETCH2_3_W, SKETCH2_3_H)
        with Locations((190.5, 157.1625)):
            Rectangle(SKETCH2_3_W, SKETCH2_3_H)
        with Locations((317.5, 68.2625)):
            Rectangle(SKETCH2_3_W, SKETCH2_3_H)
        with Locations((190.5, 68.2625)):
            Rectangle(SKETCH2_3_W, SKETCH2_3_H)
        with Locations((190.5, 246.0625)):
            Rectangle(SKETCH2_3_W, SKETCH2_3_H)
        with Locations((63.5, 157.1625)):
            Rectangle(SKETCH2_3_W, SKETCH2_3_H)
        with Locations((317.5, 157.1625)):
            Rectangle(SKETCH2_3_W, SKETCH2_3_H)
        with Locations((63.5, 68.2625)):
            Rectangle(SKETCH2_3_W, SKETCH2_3_H)
        with Locations((63.5, 246.0625)):
            Rectangle(SKETCH2_3_W, SKETCH2_3_H)
    extrude(amount=-CUT_EXTRUDE3_DEPTH, mode=Mode.SUBTRACT)

    # Shell1
    shell1_openings = [part.faces().sort_by_distance(p)[0] for p in [
        (190.5, 0, -151.204687427),
    ]]
    offset(amount=SHELL1_T, openings=shell1_openings, kind=Kind.INTERSECTION)


solid = part.part
